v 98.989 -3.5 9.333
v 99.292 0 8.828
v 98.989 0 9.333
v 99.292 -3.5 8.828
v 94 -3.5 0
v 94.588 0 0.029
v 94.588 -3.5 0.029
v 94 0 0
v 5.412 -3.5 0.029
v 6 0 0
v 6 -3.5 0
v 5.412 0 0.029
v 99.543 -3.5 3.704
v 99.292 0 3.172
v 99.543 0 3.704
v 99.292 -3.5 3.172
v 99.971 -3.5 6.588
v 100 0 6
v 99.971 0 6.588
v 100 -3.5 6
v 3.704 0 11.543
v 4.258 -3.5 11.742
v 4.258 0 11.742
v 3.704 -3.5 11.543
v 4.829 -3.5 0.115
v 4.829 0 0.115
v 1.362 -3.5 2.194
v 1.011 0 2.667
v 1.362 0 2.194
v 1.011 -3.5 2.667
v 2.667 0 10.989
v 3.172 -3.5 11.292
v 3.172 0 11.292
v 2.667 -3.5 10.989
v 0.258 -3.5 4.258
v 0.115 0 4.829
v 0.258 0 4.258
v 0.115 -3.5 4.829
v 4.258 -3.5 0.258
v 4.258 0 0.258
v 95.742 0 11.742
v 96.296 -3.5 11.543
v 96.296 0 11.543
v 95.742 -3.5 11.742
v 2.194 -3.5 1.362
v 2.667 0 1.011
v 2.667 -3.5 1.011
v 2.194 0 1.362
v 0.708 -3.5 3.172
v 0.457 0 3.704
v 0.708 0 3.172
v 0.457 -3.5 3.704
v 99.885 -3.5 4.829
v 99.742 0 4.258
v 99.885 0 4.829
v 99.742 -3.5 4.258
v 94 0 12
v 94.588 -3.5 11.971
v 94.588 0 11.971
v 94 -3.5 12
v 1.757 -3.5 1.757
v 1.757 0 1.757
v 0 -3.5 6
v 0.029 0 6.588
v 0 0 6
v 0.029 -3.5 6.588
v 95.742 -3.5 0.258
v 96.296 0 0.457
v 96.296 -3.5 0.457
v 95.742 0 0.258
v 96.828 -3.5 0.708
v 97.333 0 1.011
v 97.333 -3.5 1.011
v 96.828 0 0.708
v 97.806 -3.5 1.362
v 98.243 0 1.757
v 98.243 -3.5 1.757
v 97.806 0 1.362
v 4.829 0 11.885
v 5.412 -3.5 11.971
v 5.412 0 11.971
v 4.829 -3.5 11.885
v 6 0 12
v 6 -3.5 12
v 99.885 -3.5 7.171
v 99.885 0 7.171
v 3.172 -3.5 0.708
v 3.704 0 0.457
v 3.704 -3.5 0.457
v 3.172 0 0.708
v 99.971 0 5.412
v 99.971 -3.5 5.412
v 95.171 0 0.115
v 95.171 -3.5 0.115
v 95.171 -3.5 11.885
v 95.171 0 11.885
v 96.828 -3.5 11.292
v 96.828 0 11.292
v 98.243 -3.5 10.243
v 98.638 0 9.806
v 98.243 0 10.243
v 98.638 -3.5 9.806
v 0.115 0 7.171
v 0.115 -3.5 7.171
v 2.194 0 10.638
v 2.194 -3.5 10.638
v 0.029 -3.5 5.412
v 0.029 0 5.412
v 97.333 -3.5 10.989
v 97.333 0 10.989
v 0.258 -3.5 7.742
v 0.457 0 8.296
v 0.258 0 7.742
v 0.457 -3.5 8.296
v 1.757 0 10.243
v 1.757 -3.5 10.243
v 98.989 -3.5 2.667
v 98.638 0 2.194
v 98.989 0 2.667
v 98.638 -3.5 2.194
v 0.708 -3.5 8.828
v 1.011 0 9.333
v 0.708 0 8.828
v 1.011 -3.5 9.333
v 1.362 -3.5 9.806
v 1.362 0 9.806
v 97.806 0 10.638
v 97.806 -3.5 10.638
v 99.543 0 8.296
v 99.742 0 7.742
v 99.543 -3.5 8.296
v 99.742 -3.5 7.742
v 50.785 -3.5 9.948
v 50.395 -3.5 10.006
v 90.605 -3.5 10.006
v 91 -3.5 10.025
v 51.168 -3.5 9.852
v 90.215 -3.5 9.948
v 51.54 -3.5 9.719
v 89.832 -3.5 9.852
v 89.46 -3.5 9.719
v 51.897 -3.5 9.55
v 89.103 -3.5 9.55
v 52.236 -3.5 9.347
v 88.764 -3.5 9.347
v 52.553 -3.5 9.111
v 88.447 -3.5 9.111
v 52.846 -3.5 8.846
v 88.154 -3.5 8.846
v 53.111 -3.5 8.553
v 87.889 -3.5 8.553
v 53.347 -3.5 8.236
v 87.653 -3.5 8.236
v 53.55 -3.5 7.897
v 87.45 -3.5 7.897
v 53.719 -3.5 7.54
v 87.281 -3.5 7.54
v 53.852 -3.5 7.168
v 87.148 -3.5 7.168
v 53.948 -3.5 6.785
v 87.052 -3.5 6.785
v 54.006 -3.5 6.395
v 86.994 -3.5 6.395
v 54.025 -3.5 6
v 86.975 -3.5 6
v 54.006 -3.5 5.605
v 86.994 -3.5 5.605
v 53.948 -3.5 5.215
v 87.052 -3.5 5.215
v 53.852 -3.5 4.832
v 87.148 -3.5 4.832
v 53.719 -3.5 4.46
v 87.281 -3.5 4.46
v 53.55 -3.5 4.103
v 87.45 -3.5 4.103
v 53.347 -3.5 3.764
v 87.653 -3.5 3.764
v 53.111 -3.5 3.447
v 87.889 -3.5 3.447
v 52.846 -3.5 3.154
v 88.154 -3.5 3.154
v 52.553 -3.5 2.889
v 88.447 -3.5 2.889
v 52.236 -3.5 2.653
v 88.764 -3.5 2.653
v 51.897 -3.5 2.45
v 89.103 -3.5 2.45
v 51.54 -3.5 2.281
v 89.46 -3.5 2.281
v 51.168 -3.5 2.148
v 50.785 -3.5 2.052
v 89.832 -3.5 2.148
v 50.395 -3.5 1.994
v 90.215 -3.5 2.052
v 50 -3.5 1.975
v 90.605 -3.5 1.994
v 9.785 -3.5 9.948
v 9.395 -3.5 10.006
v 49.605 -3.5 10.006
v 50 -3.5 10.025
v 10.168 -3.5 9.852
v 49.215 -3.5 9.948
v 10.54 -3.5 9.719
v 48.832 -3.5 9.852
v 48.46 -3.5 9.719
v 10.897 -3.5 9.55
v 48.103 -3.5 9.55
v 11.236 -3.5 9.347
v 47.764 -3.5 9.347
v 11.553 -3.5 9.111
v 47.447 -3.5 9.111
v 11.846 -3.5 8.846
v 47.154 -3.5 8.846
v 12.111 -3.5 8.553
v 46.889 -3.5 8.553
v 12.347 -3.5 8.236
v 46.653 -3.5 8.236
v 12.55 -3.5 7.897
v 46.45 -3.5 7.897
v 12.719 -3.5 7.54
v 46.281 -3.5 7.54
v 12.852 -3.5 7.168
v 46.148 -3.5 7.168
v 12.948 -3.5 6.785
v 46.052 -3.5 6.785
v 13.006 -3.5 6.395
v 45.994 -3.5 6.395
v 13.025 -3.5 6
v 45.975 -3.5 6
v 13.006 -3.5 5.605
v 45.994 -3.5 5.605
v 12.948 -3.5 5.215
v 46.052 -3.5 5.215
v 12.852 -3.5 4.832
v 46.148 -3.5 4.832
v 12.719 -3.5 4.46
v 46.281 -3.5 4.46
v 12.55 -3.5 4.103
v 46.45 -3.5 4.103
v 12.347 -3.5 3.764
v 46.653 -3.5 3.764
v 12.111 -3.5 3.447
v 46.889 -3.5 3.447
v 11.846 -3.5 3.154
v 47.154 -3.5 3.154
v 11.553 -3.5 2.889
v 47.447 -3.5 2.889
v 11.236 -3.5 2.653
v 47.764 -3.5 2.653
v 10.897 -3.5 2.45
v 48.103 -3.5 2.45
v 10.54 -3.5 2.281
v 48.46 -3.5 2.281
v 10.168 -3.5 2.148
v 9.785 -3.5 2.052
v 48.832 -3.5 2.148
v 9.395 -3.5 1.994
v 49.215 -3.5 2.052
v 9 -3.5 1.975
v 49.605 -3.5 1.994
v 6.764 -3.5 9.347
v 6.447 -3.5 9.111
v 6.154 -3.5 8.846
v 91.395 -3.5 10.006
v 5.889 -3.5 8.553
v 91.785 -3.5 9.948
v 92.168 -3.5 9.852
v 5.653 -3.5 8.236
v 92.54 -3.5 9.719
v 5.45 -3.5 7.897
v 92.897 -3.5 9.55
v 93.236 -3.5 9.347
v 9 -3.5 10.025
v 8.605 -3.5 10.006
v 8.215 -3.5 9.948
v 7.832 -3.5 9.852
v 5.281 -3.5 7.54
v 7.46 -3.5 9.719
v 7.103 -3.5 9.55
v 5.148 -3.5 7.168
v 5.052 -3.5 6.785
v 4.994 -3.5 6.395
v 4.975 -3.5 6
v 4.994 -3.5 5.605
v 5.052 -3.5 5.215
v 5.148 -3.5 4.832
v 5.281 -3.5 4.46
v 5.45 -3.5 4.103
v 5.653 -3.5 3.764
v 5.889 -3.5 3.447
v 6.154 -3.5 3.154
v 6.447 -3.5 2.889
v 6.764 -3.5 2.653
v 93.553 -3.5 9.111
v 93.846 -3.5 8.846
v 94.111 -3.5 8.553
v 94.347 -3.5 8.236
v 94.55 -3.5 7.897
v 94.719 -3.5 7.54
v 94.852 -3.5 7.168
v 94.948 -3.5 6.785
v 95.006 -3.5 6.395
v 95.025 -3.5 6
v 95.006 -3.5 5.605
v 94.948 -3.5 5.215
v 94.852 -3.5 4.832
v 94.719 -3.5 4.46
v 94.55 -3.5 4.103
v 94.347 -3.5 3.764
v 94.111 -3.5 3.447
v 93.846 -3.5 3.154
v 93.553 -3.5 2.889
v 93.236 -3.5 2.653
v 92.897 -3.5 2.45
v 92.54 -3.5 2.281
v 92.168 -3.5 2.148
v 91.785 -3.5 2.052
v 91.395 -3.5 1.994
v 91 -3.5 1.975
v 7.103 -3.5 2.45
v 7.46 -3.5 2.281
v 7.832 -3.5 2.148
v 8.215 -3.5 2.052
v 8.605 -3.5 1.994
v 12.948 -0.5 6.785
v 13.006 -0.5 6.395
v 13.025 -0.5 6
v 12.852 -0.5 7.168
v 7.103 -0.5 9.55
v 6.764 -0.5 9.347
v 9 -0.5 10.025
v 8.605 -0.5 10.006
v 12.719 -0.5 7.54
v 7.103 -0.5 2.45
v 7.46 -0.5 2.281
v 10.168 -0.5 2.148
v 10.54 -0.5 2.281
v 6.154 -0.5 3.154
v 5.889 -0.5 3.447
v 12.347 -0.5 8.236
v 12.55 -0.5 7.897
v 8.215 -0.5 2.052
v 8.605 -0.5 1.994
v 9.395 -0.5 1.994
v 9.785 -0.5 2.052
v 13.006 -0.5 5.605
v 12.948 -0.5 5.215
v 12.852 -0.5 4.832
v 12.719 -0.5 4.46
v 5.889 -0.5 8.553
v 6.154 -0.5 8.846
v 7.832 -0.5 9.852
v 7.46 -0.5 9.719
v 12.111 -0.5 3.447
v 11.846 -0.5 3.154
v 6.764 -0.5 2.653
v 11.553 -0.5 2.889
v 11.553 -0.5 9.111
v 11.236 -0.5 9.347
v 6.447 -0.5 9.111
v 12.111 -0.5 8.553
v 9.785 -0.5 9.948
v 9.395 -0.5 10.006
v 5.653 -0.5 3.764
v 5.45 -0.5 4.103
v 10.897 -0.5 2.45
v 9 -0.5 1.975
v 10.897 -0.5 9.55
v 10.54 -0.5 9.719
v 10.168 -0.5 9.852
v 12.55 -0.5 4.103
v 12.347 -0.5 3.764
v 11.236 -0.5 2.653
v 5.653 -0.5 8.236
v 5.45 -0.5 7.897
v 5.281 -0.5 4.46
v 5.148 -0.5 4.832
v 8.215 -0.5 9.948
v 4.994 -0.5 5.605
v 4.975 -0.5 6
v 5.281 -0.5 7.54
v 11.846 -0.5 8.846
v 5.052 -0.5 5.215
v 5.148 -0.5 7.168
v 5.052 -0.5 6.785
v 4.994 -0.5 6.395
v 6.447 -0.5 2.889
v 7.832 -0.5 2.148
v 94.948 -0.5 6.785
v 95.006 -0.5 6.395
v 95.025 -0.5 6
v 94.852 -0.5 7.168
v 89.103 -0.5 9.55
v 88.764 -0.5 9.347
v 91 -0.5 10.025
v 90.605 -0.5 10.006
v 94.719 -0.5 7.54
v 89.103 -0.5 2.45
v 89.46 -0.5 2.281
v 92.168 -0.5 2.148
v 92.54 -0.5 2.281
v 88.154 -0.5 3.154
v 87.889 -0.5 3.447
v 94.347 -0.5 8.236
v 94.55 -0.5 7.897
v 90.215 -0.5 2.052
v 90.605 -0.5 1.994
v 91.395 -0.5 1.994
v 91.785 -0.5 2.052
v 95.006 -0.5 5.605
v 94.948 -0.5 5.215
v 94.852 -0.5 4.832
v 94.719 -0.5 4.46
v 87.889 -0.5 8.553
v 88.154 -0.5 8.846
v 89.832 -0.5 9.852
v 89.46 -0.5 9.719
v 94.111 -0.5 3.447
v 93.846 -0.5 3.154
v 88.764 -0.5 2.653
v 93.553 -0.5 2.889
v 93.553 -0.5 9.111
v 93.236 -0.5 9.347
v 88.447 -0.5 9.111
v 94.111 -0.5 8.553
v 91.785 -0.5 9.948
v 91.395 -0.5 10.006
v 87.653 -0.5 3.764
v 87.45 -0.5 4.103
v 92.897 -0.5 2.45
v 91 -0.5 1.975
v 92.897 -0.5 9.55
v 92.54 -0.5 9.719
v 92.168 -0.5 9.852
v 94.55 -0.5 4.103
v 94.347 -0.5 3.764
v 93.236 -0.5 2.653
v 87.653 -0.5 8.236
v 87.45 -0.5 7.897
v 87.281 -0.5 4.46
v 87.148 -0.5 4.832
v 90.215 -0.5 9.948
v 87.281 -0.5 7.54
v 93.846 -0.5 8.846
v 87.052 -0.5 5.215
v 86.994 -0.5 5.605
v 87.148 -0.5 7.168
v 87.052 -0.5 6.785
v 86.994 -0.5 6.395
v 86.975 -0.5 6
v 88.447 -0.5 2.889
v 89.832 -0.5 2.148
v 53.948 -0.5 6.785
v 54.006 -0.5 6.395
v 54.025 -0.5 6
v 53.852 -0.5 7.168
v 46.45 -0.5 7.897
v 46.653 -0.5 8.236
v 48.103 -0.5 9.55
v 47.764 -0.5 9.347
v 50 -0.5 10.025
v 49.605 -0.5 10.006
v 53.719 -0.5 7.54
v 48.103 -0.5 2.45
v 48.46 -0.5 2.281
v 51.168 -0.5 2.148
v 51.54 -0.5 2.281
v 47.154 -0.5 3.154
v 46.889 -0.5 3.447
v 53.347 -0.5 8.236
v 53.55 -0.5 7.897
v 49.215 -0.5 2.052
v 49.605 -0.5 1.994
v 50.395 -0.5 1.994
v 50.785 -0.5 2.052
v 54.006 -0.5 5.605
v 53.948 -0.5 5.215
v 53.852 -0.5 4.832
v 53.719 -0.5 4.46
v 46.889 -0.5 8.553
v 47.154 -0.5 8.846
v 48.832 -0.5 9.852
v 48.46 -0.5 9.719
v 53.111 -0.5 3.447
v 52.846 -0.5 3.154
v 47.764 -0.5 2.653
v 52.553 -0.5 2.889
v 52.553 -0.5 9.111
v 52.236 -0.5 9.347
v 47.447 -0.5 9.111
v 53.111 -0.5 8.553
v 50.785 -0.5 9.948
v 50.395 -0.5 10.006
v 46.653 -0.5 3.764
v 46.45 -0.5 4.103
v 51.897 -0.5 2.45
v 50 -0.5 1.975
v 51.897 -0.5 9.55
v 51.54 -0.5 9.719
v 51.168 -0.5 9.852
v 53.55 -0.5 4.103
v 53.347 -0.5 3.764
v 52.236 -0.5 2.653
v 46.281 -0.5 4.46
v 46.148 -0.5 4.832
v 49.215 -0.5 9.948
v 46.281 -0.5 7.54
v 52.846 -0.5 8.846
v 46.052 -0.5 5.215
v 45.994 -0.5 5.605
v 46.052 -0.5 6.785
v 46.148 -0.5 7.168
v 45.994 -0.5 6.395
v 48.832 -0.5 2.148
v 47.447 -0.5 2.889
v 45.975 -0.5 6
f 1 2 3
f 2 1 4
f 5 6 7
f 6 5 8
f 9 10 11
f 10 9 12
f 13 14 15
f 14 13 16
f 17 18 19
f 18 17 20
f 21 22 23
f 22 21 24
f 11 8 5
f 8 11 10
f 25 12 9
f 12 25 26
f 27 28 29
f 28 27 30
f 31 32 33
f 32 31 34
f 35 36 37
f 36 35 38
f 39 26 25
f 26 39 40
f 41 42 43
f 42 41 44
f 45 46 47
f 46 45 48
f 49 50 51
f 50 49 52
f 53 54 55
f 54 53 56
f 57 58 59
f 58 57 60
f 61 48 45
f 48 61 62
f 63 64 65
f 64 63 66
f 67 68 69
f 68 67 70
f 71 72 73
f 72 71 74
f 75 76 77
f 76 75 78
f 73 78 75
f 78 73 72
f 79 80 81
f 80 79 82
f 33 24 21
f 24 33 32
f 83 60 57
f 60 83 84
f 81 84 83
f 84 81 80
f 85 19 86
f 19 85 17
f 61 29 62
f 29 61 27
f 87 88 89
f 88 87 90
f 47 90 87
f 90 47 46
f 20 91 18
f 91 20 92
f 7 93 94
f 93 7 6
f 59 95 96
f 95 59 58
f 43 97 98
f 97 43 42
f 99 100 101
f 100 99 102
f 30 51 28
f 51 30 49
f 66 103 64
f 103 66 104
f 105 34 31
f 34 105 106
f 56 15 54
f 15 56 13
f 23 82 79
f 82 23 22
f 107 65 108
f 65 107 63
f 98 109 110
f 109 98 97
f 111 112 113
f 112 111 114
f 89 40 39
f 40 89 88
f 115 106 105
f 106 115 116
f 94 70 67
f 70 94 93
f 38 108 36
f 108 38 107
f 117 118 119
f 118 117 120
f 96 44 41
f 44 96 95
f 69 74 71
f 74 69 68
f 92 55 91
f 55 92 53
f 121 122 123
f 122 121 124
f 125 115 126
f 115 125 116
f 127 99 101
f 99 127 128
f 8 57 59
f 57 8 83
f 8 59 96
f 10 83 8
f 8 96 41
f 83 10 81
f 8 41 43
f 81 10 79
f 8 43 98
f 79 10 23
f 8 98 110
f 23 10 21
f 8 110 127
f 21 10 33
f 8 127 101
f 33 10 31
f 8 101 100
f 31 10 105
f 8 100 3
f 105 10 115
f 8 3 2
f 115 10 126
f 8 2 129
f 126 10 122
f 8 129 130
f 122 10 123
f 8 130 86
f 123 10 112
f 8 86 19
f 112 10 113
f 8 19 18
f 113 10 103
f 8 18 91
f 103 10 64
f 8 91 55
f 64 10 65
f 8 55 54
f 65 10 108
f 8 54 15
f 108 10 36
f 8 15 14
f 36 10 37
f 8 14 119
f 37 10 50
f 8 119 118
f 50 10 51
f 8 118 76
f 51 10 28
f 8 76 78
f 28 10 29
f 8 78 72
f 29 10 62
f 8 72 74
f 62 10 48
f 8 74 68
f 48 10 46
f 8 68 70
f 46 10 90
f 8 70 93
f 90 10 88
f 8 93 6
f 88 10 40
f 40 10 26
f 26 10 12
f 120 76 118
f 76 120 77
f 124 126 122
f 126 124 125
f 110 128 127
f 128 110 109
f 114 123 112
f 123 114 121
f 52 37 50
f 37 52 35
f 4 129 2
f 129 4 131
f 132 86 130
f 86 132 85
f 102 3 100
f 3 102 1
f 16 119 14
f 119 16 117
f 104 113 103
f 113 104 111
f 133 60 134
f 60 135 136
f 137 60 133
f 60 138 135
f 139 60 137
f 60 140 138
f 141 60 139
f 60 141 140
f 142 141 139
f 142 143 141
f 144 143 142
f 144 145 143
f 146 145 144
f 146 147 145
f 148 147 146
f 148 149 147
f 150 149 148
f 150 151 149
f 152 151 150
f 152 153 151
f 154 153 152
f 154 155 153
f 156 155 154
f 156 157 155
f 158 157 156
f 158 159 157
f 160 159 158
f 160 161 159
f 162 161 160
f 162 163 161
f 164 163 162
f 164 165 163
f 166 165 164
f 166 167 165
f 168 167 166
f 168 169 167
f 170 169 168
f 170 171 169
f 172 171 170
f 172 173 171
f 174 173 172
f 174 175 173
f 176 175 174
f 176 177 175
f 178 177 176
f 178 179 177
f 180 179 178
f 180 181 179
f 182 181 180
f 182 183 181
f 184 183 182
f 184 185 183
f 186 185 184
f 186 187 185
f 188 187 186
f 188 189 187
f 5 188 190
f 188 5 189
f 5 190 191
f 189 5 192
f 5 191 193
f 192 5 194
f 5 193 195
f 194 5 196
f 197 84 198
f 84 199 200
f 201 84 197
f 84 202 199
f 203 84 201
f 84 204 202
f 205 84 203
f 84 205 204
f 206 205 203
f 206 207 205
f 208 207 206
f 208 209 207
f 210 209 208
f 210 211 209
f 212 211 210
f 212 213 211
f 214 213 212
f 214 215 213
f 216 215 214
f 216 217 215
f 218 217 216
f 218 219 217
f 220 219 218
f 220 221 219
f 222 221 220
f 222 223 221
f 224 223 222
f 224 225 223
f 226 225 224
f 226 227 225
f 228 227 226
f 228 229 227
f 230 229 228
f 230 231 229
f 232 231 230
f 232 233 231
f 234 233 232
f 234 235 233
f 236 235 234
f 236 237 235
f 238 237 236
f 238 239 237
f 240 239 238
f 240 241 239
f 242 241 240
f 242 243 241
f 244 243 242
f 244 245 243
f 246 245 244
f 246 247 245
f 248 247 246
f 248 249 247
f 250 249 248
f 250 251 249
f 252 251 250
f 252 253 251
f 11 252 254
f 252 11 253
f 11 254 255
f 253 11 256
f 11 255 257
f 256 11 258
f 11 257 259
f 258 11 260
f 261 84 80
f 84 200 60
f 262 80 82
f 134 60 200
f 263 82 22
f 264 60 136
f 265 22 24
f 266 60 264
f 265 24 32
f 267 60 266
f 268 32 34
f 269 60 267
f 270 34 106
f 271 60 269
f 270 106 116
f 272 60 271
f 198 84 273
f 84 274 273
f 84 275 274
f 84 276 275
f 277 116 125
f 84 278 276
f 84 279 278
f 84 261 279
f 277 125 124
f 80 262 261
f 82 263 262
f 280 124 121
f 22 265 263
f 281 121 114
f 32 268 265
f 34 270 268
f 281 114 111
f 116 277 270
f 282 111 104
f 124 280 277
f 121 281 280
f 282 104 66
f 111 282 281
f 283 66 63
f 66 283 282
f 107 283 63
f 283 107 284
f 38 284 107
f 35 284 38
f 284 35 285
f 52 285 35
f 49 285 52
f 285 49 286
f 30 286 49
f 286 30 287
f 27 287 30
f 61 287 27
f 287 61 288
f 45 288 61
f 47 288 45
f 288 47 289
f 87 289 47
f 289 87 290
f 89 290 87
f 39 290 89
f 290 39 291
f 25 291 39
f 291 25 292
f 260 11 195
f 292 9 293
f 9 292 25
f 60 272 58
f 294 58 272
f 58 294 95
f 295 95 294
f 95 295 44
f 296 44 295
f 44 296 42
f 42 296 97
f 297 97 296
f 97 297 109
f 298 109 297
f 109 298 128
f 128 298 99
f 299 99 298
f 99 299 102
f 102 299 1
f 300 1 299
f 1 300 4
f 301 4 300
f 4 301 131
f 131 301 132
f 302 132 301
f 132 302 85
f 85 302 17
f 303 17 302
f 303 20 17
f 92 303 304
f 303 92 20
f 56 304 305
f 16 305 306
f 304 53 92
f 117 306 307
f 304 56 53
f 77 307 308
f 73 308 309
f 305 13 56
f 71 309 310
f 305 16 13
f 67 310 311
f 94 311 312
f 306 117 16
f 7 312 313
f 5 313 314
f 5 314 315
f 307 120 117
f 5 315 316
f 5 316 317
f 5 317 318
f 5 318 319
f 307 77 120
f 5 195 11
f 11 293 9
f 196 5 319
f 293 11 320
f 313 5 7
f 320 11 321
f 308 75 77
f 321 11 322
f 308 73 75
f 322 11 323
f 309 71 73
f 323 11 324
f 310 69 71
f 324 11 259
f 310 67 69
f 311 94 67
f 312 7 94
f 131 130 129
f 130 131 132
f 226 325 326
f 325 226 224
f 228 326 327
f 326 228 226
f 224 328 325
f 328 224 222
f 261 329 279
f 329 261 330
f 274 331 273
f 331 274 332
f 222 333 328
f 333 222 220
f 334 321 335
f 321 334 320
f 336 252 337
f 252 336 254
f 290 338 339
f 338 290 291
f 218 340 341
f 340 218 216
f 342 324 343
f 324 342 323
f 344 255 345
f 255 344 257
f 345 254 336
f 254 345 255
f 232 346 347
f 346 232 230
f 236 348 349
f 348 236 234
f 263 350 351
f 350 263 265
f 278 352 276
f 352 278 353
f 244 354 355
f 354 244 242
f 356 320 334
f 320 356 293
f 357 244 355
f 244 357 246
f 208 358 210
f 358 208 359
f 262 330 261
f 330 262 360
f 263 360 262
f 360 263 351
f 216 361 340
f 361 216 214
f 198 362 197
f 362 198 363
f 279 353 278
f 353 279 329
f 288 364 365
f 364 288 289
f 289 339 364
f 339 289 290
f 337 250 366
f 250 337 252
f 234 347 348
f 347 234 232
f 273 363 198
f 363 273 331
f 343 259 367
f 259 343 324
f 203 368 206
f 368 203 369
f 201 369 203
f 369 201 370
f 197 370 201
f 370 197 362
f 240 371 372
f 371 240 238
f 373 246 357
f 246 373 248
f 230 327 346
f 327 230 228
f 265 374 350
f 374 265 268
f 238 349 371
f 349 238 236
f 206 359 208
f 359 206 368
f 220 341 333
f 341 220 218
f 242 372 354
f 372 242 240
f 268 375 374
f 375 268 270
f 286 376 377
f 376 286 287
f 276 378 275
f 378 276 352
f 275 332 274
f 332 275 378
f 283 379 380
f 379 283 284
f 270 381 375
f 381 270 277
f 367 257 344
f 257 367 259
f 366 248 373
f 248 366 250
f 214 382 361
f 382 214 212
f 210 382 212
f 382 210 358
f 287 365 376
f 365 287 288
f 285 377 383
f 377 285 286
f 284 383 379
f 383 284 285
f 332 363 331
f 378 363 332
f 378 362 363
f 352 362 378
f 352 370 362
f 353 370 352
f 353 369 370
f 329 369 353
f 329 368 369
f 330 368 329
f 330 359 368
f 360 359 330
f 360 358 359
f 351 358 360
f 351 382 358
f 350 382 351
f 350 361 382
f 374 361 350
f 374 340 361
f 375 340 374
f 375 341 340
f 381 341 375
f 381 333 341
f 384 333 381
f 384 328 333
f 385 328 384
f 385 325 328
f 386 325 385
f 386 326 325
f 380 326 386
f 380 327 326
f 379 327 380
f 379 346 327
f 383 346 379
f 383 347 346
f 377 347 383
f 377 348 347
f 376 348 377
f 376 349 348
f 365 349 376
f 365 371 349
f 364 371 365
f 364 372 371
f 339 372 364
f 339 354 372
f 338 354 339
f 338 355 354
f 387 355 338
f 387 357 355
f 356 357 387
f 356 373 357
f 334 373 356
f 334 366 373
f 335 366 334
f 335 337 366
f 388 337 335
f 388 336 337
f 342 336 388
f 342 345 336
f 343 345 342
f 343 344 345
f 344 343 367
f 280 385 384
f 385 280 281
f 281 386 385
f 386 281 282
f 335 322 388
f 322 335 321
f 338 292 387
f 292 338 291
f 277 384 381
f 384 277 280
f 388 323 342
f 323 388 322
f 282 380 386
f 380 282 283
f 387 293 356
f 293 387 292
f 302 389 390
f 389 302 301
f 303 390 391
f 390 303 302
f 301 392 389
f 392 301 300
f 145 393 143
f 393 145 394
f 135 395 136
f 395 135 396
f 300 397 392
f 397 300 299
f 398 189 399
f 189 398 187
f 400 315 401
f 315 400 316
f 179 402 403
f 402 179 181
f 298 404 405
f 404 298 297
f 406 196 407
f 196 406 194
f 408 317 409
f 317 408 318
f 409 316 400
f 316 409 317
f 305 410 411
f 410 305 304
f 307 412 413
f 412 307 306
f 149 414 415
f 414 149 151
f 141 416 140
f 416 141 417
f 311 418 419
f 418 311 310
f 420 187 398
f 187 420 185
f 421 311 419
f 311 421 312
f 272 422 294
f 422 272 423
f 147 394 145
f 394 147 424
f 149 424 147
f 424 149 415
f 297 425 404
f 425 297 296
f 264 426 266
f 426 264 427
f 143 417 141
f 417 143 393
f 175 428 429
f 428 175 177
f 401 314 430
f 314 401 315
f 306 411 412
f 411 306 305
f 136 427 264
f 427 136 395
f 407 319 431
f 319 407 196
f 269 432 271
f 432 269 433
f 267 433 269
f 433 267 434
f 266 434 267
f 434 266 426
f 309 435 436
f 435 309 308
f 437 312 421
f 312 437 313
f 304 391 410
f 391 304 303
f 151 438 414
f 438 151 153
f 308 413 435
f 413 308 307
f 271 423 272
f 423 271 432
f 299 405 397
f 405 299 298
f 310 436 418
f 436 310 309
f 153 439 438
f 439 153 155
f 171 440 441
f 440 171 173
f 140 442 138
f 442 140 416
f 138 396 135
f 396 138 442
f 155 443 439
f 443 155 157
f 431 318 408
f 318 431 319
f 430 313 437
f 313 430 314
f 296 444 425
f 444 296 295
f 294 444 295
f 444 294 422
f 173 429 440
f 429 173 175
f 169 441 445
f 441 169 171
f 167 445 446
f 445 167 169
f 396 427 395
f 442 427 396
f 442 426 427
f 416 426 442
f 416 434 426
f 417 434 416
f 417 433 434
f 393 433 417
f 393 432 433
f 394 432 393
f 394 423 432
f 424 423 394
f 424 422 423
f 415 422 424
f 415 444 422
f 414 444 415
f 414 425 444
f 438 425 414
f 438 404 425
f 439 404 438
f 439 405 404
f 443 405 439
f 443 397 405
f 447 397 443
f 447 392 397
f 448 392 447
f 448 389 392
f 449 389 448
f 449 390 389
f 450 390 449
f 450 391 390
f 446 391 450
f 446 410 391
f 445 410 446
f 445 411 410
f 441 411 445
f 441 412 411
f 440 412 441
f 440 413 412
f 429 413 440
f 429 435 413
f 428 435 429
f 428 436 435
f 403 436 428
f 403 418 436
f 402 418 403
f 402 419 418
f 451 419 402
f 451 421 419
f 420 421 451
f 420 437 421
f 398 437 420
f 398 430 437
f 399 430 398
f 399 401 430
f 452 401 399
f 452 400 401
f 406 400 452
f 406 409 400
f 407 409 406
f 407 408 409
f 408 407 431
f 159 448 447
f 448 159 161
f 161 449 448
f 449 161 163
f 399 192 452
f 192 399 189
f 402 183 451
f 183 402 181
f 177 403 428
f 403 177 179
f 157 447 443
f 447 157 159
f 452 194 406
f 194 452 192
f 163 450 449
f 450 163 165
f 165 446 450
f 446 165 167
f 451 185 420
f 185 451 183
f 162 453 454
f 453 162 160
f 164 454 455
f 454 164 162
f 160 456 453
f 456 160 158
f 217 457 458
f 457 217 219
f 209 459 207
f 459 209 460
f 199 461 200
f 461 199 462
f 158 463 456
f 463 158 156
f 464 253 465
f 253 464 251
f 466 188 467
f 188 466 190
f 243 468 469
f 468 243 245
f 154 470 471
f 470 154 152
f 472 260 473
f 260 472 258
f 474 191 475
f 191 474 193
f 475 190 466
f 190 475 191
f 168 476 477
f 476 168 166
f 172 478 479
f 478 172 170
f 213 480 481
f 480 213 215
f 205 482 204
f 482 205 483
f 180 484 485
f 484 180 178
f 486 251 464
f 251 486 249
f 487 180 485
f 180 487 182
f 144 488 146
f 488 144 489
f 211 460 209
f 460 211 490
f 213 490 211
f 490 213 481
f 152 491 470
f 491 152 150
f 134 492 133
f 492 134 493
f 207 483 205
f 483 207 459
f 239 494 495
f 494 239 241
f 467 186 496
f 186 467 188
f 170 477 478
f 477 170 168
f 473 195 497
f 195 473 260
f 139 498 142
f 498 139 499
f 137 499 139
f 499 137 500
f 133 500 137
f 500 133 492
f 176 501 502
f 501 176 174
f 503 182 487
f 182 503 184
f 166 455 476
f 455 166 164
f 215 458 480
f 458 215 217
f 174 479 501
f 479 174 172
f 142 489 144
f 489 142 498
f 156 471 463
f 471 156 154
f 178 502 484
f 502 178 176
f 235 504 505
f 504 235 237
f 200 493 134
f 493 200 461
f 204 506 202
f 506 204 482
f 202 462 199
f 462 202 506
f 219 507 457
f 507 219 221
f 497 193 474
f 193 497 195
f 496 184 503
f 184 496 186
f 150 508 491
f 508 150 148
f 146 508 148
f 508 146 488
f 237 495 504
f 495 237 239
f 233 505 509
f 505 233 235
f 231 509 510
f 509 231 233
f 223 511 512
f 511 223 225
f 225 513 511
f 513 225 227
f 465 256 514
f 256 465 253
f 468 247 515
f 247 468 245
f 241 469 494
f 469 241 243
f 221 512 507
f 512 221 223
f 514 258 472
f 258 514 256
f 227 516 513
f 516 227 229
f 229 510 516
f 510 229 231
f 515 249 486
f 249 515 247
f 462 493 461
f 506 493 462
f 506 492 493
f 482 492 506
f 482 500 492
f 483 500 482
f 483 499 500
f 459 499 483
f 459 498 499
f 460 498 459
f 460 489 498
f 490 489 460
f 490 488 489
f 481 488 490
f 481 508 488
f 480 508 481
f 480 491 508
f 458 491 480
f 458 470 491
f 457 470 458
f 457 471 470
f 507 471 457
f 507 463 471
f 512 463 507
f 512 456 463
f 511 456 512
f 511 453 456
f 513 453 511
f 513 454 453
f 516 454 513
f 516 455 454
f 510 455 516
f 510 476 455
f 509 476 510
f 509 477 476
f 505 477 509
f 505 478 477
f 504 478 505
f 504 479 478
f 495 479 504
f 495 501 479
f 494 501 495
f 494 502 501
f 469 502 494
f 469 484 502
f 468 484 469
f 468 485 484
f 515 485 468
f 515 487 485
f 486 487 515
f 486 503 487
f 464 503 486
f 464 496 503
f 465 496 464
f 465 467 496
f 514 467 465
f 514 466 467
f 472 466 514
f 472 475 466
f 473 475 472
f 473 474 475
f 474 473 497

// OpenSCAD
$fn = 64;

module rcube(size, radius, center = false){
    points = [
        for (p = [
            [radius, radius],
            [radius, size.y - radius],
            [size.x - radius, radius],
            [size.x - radius, size.y - radius]
        ])
        if (center) [p[0] - size.x / 2, p[1] - size.y / 2]
        else p
    ];
    hull(){
        for (p = points) translate(p) cylinder(r=radius, h=size.z);
    }
}

difference() {
    rotate([90, 0, 0])
    rcube([100, 12, 3.5], 6);

    translate([9, -0.5, 6])
    rotate([90, 0, 0])
    cylinder(h=3.1, d=8.05);
    
    translate([91, -0.5, 6])
    rotate([90, 0, 0])
    cylinder(h=3.1, d=8.05);
    
    translate([50, -0.5, 6])
    rotate([90, 0, 0])
    cylinder(h=3.1, d=8.05);
}
